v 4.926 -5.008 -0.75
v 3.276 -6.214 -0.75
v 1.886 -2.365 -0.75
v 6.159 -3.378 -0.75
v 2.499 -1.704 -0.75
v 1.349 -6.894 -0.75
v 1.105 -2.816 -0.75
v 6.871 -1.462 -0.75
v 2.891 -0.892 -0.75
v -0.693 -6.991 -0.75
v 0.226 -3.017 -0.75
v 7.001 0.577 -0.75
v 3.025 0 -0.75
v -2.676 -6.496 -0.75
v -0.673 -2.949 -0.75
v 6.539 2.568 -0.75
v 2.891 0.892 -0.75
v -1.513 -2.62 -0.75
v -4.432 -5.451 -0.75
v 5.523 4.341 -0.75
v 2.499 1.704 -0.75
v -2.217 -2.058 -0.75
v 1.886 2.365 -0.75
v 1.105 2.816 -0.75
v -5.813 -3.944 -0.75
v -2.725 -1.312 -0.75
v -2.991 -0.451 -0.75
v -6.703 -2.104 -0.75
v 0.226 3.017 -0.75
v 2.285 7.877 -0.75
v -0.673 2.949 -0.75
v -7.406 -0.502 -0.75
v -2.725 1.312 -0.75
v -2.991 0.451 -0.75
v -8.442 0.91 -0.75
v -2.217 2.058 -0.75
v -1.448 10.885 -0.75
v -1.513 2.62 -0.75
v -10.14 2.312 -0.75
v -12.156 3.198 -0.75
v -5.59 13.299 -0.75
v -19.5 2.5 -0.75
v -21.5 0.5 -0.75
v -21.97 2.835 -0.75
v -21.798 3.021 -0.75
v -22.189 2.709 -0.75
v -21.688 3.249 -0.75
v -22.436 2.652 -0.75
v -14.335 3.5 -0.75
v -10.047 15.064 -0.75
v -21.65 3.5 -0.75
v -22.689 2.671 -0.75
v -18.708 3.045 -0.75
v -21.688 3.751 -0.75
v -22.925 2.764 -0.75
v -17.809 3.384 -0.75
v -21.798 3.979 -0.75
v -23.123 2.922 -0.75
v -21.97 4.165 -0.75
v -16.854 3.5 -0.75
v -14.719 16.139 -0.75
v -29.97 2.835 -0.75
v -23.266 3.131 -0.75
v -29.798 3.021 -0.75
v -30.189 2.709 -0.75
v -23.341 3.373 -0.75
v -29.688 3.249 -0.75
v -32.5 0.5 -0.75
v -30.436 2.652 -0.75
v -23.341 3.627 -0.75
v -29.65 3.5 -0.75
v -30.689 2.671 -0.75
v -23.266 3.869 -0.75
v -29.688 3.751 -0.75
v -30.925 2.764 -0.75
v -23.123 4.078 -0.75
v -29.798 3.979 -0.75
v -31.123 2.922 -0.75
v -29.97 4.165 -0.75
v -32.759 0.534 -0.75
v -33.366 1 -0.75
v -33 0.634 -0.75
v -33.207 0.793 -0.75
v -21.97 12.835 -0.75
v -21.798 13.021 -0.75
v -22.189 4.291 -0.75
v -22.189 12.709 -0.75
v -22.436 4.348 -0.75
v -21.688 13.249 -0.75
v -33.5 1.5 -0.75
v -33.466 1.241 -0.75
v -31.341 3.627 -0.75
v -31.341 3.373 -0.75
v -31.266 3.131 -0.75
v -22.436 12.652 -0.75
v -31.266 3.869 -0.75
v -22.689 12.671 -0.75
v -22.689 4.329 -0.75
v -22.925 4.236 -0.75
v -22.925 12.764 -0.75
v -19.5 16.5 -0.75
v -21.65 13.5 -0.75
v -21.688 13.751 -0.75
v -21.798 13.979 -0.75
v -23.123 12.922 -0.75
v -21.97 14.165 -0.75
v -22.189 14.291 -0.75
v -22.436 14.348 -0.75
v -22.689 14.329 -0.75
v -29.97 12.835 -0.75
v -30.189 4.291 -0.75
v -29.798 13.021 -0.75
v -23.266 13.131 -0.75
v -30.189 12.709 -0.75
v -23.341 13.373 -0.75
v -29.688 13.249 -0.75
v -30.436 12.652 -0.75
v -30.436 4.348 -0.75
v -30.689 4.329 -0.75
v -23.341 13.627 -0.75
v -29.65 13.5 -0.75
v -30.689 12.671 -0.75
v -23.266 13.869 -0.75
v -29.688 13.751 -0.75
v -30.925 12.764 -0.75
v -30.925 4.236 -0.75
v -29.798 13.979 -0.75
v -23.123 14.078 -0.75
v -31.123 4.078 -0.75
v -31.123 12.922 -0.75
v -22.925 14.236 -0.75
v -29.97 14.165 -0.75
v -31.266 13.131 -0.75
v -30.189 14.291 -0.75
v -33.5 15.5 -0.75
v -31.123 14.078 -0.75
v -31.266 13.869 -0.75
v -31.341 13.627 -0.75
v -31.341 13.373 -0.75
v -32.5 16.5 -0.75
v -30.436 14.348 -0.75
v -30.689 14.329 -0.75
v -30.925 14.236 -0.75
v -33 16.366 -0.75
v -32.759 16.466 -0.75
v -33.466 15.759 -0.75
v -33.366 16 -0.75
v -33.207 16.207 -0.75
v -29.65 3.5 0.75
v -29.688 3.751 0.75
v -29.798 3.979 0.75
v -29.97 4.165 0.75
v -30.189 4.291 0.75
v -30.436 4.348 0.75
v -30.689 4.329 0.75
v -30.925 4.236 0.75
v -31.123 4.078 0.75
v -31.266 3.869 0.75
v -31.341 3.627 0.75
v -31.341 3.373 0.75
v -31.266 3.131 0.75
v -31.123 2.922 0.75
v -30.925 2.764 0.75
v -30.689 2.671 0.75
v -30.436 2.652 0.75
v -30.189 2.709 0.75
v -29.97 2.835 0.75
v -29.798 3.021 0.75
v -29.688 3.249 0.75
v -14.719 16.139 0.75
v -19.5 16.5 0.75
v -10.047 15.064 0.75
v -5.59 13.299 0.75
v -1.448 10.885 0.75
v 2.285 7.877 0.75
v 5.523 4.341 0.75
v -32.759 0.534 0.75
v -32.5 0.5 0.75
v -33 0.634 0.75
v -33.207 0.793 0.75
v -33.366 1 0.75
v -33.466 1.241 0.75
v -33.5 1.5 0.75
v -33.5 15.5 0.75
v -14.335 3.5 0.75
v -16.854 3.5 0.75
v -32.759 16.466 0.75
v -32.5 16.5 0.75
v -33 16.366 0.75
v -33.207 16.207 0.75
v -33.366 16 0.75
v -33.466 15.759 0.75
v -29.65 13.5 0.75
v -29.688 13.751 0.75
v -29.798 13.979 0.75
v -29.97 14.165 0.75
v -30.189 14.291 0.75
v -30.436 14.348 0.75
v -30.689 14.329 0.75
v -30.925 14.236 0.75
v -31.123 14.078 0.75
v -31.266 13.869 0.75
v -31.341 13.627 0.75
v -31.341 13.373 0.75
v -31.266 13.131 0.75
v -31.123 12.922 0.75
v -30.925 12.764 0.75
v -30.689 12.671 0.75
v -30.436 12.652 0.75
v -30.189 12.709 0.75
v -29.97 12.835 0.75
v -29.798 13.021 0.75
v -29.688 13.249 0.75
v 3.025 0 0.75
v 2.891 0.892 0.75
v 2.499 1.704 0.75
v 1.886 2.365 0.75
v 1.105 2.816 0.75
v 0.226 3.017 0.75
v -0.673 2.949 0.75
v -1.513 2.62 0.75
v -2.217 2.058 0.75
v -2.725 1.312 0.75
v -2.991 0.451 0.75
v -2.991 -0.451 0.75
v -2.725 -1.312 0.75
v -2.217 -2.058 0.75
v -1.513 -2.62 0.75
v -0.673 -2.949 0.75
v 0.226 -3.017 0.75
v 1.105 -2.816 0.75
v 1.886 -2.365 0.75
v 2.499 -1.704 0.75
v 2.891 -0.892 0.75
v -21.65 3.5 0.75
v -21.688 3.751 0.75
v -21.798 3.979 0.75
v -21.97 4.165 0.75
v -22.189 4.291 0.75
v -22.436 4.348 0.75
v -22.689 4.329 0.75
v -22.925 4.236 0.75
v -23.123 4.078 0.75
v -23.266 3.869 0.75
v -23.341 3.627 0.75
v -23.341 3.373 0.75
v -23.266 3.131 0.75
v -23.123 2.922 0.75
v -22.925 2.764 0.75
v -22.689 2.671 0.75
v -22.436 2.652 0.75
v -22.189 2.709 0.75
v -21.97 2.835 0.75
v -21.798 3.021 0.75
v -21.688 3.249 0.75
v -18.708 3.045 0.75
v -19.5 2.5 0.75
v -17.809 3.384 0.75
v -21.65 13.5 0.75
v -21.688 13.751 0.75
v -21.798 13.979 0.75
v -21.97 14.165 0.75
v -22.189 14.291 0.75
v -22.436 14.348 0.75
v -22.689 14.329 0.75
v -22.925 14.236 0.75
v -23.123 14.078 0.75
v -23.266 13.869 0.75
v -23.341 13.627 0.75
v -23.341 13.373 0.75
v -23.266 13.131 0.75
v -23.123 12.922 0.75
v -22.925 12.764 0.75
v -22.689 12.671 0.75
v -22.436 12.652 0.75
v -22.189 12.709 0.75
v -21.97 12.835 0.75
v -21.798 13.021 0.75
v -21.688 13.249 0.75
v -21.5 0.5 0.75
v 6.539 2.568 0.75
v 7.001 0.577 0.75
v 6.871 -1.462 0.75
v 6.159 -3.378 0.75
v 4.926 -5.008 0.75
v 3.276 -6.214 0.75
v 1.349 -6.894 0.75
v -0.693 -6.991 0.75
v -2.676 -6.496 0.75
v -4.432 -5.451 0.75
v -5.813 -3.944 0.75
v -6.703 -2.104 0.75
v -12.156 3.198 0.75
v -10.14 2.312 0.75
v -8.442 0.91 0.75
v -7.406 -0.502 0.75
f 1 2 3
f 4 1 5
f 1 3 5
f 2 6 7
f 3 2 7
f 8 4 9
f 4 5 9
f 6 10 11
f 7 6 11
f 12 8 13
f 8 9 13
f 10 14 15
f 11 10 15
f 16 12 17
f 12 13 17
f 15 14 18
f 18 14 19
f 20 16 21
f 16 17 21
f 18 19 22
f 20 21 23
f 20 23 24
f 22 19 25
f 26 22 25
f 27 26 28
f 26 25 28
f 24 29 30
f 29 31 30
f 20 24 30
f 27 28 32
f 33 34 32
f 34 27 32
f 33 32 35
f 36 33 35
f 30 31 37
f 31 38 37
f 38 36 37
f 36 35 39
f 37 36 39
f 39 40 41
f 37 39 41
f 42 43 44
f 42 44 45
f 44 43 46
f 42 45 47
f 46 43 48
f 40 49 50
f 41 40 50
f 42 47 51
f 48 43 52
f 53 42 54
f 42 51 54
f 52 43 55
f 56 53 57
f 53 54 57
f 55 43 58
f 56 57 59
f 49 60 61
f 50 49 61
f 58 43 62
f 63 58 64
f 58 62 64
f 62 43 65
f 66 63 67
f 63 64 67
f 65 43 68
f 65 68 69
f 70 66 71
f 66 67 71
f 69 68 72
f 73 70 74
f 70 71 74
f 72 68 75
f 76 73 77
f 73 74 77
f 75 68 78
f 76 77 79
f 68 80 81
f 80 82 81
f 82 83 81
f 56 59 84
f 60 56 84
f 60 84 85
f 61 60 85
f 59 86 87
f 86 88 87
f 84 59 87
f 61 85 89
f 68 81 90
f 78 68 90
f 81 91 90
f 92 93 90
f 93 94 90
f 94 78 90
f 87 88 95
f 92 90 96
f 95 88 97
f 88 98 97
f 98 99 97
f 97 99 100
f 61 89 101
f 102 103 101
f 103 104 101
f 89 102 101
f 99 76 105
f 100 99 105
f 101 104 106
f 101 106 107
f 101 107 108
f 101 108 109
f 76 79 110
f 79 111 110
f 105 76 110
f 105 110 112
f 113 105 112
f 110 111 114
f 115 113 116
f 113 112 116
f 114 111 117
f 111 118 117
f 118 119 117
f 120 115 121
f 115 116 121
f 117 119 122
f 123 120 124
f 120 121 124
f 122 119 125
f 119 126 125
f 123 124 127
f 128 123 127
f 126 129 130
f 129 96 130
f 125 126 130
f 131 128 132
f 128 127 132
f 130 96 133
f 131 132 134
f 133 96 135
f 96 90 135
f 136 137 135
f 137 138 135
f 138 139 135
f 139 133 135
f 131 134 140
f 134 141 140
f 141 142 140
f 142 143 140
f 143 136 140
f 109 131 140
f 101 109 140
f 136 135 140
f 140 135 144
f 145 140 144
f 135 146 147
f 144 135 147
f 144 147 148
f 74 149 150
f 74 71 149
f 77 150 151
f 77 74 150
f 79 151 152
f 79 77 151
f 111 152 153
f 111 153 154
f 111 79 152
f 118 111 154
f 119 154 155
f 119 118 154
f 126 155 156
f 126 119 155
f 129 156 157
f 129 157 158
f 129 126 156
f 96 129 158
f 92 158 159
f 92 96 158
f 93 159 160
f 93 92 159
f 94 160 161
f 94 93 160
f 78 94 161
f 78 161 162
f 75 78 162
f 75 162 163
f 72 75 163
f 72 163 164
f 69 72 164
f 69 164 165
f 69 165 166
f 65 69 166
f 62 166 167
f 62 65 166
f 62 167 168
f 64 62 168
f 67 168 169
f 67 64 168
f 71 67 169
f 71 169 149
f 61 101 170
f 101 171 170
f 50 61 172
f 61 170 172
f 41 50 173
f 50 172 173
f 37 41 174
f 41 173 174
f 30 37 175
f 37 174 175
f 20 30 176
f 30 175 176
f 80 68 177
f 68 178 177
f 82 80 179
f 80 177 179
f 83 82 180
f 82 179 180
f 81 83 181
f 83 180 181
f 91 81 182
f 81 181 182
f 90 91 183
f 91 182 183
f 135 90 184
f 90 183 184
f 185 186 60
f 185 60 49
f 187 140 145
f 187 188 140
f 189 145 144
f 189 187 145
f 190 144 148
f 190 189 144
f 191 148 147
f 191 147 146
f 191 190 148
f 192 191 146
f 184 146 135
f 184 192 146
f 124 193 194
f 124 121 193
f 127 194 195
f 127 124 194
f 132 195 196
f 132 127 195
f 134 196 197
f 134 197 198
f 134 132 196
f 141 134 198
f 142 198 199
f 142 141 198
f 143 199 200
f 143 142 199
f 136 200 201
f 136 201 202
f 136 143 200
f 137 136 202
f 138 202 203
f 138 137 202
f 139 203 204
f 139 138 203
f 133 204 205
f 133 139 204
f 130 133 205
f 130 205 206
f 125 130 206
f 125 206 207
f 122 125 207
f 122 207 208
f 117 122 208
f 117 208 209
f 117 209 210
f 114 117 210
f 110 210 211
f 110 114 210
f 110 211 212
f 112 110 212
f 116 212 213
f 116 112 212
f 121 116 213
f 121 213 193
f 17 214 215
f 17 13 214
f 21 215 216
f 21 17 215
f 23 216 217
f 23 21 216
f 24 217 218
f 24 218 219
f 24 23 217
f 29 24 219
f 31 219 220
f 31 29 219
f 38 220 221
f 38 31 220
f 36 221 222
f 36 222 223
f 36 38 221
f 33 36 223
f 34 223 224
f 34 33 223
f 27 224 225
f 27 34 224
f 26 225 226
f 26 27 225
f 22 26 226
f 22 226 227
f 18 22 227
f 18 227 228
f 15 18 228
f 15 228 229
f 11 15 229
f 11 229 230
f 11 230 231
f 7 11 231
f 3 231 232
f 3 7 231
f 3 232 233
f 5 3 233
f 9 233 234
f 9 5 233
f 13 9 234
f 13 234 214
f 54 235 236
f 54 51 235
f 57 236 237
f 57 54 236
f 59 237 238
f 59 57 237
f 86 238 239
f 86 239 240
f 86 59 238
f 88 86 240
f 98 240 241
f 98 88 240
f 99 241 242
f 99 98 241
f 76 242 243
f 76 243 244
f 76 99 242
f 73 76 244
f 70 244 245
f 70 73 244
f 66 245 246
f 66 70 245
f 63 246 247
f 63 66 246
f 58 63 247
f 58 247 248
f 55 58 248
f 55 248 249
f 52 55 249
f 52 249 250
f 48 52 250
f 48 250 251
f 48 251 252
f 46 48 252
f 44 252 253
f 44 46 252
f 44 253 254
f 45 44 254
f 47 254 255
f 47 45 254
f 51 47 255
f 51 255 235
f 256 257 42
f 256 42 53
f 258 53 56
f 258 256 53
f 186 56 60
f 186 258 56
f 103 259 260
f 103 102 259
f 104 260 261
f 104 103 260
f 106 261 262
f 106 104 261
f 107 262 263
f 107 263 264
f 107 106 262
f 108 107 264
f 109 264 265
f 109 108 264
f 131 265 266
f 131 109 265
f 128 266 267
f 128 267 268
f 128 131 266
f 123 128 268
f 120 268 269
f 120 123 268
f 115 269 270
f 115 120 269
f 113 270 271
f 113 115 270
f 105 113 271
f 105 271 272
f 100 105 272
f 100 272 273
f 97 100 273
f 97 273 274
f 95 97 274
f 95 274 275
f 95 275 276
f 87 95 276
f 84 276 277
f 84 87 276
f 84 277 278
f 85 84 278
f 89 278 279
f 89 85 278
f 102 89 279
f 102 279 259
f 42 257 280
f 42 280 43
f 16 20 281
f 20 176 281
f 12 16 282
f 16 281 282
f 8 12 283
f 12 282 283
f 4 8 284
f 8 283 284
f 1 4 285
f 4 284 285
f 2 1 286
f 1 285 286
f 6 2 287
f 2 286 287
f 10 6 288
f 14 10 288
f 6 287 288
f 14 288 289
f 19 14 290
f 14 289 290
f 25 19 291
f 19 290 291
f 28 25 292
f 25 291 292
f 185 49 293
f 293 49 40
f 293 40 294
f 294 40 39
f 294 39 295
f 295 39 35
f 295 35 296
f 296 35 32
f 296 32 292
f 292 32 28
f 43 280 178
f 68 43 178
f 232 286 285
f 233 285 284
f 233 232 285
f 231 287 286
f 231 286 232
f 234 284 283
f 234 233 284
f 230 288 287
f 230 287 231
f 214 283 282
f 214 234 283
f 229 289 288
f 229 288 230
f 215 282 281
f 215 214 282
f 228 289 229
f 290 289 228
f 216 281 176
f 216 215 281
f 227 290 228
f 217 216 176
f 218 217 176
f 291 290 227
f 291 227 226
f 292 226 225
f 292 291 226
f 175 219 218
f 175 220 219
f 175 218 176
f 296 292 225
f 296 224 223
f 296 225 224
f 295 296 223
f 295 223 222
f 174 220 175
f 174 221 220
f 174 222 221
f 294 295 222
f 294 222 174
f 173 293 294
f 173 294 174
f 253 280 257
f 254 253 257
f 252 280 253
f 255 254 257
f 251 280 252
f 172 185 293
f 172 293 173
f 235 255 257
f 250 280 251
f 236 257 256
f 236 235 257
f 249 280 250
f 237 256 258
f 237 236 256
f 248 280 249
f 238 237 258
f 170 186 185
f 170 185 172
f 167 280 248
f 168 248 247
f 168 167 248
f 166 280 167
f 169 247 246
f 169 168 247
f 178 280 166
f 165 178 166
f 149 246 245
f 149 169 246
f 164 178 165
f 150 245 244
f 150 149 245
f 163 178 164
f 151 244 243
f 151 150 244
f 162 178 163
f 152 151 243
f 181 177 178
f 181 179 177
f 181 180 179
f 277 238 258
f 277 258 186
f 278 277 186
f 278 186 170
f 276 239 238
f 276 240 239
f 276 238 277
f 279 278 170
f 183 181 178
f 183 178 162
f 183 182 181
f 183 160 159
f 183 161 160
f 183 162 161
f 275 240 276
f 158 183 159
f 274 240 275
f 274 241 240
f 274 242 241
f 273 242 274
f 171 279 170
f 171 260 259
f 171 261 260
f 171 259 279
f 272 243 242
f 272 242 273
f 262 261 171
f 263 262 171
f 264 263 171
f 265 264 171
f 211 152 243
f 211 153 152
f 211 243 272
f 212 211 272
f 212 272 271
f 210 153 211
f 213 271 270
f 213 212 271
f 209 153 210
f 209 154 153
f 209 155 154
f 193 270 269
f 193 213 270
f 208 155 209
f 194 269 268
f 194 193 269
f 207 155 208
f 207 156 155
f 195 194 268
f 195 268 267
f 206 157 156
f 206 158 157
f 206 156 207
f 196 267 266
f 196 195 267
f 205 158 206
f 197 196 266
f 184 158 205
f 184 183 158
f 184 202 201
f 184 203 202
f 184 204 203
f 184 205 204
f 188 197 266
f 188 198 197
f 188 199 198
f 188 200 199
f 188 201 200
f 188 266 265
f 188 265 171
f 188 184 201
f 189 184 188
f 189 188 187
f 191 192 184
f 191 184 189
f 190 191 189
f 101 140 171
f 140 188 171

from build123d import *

# Parameters (mm, degrees)
ESQUISSE1_R             = 3.025
ESQUISSE1_R_2           = 0.85
BOSS_EXTRU_1_DEPTH      = 0.75
CONG_2_R                = 1
ESQUISSE2_W             = 12.492816186
ESQUISSE2_H             = 3
ENL_V_MAT_EXTRU_1_DEPTH = 38.373118682
CHANFREIN1_SIZE         = 2
CONG_3_R                = 4
CONG_4_R                = 8


with BuildPart() as part:
    # Esquisse1 → Boss.-Extru.1 (new, symmetric)
    with BuildSketch(Plane.XY):
        with BuildLine():
            Line((-33.5, 16.5), (-19.5, 16.5))
            ThreePointArc((-19.5, 16.5), (-5.589776158, 13.29943825), (5.522918298, 4.34142816))
            ThreePointArc((5.522918298, 4.34142816), (2.059102622, -6.716451548), (-7.007183814, 0.5))
            Line((-7.007183814, 0.5), (-19.5, 0.5))
            Line((-19.5, 0.5), (-33.5, 0.5))
            Line((-33.5, 0.5), (-33.5, 16.5))
        make_face()
        Circle(ESQUISSE1_R, mode=Mode.SUBTRACT)
        with Locations((-30.5, 13.5)):
            Circle(ESQUISSE1_R_2, mode=Mode.SUBTRACT)
        with Locations((-22.5, 13.5)):
            Circle(ESQUISSE1_R_2, mode=Mode.SUBTRACT)
        with Locations((-22.5, 3.5)):
            Circle(ESQUISSE1_R_2, mode=Mode.SUBTRACT)
        with Locations((-30.5, 3.5)):
            Circle(ESQUISSE1_R_2, mode=Mode.SUBTRACT)
    extrude(amount=BOSS_EXTRU_1_DEPTH, both=True)

    # Congé2
    cong_2_edges = [part.edges().sort_by_distance(p)[0] for p in [
        (-33.5, 16.5, 0),
        (-33.5, 0.5, 0),
    ]]
    fillet(cong_2_edges, radius=CONG_2_R)

    # Esquisse2 → Enlèv. mat.-Extru.1 (cut, through all)
    with BuildSketch(Plane.XY.offset(0.75)):
        with Locations((-13.253591907, 2)):
            Rectangle(ESQUISSE2_W, ESQUISSE2_H)
    extrude(amount=-ENL_V_MAT_EXTRU_1_DEPTH, mode=Mode.SUBTRACT)

    # Chanfrein1
    chanfrein1_edges = [part.edges().sort_by_distance(p)[0] for p in [
        (-19.5, 0.5, 0),
    ]]
    chamfer(chanfrein1_edges, length=CHANFREIN1_SIZE)

    # Congé3
    # the kernel refuses this fillet: 4 mm, written as the material it adds along each edge
    with BuildSketch(Plane(origin=(-19.5, 3.5, 0.75), x_dir=(0, -1, 0), z_dir=(0, 0, -1))) as cong_3_piece_1:
        with BuildLine():
            CenterArc((4, -2.645751311), CONG_3_R, 138.590377891, 41.409622109)
            Line((0, -2.645751311), (-0.08, -2.645751311))
            Line((-0.08, -2.645751311), (-0.08, 0))
            Line((-0.08, 0), (0, 0.08))
            ThreePointArc((0, 0.08), (0.5, 0.08), (0.94, 0.052915026))
            Line((0.94, 0.052915026), (1, 0))
        make_face()
    extrude(amount=1.5)

    # Congé4
    cong_4_edges = [part.edges().sort_by_distance(p)[0] for p in [
        (-7.007183814, 3.5, 0),
    ]]
    fillet(cong_4_edges, radius=CONG_4_R)


solid = part.part
